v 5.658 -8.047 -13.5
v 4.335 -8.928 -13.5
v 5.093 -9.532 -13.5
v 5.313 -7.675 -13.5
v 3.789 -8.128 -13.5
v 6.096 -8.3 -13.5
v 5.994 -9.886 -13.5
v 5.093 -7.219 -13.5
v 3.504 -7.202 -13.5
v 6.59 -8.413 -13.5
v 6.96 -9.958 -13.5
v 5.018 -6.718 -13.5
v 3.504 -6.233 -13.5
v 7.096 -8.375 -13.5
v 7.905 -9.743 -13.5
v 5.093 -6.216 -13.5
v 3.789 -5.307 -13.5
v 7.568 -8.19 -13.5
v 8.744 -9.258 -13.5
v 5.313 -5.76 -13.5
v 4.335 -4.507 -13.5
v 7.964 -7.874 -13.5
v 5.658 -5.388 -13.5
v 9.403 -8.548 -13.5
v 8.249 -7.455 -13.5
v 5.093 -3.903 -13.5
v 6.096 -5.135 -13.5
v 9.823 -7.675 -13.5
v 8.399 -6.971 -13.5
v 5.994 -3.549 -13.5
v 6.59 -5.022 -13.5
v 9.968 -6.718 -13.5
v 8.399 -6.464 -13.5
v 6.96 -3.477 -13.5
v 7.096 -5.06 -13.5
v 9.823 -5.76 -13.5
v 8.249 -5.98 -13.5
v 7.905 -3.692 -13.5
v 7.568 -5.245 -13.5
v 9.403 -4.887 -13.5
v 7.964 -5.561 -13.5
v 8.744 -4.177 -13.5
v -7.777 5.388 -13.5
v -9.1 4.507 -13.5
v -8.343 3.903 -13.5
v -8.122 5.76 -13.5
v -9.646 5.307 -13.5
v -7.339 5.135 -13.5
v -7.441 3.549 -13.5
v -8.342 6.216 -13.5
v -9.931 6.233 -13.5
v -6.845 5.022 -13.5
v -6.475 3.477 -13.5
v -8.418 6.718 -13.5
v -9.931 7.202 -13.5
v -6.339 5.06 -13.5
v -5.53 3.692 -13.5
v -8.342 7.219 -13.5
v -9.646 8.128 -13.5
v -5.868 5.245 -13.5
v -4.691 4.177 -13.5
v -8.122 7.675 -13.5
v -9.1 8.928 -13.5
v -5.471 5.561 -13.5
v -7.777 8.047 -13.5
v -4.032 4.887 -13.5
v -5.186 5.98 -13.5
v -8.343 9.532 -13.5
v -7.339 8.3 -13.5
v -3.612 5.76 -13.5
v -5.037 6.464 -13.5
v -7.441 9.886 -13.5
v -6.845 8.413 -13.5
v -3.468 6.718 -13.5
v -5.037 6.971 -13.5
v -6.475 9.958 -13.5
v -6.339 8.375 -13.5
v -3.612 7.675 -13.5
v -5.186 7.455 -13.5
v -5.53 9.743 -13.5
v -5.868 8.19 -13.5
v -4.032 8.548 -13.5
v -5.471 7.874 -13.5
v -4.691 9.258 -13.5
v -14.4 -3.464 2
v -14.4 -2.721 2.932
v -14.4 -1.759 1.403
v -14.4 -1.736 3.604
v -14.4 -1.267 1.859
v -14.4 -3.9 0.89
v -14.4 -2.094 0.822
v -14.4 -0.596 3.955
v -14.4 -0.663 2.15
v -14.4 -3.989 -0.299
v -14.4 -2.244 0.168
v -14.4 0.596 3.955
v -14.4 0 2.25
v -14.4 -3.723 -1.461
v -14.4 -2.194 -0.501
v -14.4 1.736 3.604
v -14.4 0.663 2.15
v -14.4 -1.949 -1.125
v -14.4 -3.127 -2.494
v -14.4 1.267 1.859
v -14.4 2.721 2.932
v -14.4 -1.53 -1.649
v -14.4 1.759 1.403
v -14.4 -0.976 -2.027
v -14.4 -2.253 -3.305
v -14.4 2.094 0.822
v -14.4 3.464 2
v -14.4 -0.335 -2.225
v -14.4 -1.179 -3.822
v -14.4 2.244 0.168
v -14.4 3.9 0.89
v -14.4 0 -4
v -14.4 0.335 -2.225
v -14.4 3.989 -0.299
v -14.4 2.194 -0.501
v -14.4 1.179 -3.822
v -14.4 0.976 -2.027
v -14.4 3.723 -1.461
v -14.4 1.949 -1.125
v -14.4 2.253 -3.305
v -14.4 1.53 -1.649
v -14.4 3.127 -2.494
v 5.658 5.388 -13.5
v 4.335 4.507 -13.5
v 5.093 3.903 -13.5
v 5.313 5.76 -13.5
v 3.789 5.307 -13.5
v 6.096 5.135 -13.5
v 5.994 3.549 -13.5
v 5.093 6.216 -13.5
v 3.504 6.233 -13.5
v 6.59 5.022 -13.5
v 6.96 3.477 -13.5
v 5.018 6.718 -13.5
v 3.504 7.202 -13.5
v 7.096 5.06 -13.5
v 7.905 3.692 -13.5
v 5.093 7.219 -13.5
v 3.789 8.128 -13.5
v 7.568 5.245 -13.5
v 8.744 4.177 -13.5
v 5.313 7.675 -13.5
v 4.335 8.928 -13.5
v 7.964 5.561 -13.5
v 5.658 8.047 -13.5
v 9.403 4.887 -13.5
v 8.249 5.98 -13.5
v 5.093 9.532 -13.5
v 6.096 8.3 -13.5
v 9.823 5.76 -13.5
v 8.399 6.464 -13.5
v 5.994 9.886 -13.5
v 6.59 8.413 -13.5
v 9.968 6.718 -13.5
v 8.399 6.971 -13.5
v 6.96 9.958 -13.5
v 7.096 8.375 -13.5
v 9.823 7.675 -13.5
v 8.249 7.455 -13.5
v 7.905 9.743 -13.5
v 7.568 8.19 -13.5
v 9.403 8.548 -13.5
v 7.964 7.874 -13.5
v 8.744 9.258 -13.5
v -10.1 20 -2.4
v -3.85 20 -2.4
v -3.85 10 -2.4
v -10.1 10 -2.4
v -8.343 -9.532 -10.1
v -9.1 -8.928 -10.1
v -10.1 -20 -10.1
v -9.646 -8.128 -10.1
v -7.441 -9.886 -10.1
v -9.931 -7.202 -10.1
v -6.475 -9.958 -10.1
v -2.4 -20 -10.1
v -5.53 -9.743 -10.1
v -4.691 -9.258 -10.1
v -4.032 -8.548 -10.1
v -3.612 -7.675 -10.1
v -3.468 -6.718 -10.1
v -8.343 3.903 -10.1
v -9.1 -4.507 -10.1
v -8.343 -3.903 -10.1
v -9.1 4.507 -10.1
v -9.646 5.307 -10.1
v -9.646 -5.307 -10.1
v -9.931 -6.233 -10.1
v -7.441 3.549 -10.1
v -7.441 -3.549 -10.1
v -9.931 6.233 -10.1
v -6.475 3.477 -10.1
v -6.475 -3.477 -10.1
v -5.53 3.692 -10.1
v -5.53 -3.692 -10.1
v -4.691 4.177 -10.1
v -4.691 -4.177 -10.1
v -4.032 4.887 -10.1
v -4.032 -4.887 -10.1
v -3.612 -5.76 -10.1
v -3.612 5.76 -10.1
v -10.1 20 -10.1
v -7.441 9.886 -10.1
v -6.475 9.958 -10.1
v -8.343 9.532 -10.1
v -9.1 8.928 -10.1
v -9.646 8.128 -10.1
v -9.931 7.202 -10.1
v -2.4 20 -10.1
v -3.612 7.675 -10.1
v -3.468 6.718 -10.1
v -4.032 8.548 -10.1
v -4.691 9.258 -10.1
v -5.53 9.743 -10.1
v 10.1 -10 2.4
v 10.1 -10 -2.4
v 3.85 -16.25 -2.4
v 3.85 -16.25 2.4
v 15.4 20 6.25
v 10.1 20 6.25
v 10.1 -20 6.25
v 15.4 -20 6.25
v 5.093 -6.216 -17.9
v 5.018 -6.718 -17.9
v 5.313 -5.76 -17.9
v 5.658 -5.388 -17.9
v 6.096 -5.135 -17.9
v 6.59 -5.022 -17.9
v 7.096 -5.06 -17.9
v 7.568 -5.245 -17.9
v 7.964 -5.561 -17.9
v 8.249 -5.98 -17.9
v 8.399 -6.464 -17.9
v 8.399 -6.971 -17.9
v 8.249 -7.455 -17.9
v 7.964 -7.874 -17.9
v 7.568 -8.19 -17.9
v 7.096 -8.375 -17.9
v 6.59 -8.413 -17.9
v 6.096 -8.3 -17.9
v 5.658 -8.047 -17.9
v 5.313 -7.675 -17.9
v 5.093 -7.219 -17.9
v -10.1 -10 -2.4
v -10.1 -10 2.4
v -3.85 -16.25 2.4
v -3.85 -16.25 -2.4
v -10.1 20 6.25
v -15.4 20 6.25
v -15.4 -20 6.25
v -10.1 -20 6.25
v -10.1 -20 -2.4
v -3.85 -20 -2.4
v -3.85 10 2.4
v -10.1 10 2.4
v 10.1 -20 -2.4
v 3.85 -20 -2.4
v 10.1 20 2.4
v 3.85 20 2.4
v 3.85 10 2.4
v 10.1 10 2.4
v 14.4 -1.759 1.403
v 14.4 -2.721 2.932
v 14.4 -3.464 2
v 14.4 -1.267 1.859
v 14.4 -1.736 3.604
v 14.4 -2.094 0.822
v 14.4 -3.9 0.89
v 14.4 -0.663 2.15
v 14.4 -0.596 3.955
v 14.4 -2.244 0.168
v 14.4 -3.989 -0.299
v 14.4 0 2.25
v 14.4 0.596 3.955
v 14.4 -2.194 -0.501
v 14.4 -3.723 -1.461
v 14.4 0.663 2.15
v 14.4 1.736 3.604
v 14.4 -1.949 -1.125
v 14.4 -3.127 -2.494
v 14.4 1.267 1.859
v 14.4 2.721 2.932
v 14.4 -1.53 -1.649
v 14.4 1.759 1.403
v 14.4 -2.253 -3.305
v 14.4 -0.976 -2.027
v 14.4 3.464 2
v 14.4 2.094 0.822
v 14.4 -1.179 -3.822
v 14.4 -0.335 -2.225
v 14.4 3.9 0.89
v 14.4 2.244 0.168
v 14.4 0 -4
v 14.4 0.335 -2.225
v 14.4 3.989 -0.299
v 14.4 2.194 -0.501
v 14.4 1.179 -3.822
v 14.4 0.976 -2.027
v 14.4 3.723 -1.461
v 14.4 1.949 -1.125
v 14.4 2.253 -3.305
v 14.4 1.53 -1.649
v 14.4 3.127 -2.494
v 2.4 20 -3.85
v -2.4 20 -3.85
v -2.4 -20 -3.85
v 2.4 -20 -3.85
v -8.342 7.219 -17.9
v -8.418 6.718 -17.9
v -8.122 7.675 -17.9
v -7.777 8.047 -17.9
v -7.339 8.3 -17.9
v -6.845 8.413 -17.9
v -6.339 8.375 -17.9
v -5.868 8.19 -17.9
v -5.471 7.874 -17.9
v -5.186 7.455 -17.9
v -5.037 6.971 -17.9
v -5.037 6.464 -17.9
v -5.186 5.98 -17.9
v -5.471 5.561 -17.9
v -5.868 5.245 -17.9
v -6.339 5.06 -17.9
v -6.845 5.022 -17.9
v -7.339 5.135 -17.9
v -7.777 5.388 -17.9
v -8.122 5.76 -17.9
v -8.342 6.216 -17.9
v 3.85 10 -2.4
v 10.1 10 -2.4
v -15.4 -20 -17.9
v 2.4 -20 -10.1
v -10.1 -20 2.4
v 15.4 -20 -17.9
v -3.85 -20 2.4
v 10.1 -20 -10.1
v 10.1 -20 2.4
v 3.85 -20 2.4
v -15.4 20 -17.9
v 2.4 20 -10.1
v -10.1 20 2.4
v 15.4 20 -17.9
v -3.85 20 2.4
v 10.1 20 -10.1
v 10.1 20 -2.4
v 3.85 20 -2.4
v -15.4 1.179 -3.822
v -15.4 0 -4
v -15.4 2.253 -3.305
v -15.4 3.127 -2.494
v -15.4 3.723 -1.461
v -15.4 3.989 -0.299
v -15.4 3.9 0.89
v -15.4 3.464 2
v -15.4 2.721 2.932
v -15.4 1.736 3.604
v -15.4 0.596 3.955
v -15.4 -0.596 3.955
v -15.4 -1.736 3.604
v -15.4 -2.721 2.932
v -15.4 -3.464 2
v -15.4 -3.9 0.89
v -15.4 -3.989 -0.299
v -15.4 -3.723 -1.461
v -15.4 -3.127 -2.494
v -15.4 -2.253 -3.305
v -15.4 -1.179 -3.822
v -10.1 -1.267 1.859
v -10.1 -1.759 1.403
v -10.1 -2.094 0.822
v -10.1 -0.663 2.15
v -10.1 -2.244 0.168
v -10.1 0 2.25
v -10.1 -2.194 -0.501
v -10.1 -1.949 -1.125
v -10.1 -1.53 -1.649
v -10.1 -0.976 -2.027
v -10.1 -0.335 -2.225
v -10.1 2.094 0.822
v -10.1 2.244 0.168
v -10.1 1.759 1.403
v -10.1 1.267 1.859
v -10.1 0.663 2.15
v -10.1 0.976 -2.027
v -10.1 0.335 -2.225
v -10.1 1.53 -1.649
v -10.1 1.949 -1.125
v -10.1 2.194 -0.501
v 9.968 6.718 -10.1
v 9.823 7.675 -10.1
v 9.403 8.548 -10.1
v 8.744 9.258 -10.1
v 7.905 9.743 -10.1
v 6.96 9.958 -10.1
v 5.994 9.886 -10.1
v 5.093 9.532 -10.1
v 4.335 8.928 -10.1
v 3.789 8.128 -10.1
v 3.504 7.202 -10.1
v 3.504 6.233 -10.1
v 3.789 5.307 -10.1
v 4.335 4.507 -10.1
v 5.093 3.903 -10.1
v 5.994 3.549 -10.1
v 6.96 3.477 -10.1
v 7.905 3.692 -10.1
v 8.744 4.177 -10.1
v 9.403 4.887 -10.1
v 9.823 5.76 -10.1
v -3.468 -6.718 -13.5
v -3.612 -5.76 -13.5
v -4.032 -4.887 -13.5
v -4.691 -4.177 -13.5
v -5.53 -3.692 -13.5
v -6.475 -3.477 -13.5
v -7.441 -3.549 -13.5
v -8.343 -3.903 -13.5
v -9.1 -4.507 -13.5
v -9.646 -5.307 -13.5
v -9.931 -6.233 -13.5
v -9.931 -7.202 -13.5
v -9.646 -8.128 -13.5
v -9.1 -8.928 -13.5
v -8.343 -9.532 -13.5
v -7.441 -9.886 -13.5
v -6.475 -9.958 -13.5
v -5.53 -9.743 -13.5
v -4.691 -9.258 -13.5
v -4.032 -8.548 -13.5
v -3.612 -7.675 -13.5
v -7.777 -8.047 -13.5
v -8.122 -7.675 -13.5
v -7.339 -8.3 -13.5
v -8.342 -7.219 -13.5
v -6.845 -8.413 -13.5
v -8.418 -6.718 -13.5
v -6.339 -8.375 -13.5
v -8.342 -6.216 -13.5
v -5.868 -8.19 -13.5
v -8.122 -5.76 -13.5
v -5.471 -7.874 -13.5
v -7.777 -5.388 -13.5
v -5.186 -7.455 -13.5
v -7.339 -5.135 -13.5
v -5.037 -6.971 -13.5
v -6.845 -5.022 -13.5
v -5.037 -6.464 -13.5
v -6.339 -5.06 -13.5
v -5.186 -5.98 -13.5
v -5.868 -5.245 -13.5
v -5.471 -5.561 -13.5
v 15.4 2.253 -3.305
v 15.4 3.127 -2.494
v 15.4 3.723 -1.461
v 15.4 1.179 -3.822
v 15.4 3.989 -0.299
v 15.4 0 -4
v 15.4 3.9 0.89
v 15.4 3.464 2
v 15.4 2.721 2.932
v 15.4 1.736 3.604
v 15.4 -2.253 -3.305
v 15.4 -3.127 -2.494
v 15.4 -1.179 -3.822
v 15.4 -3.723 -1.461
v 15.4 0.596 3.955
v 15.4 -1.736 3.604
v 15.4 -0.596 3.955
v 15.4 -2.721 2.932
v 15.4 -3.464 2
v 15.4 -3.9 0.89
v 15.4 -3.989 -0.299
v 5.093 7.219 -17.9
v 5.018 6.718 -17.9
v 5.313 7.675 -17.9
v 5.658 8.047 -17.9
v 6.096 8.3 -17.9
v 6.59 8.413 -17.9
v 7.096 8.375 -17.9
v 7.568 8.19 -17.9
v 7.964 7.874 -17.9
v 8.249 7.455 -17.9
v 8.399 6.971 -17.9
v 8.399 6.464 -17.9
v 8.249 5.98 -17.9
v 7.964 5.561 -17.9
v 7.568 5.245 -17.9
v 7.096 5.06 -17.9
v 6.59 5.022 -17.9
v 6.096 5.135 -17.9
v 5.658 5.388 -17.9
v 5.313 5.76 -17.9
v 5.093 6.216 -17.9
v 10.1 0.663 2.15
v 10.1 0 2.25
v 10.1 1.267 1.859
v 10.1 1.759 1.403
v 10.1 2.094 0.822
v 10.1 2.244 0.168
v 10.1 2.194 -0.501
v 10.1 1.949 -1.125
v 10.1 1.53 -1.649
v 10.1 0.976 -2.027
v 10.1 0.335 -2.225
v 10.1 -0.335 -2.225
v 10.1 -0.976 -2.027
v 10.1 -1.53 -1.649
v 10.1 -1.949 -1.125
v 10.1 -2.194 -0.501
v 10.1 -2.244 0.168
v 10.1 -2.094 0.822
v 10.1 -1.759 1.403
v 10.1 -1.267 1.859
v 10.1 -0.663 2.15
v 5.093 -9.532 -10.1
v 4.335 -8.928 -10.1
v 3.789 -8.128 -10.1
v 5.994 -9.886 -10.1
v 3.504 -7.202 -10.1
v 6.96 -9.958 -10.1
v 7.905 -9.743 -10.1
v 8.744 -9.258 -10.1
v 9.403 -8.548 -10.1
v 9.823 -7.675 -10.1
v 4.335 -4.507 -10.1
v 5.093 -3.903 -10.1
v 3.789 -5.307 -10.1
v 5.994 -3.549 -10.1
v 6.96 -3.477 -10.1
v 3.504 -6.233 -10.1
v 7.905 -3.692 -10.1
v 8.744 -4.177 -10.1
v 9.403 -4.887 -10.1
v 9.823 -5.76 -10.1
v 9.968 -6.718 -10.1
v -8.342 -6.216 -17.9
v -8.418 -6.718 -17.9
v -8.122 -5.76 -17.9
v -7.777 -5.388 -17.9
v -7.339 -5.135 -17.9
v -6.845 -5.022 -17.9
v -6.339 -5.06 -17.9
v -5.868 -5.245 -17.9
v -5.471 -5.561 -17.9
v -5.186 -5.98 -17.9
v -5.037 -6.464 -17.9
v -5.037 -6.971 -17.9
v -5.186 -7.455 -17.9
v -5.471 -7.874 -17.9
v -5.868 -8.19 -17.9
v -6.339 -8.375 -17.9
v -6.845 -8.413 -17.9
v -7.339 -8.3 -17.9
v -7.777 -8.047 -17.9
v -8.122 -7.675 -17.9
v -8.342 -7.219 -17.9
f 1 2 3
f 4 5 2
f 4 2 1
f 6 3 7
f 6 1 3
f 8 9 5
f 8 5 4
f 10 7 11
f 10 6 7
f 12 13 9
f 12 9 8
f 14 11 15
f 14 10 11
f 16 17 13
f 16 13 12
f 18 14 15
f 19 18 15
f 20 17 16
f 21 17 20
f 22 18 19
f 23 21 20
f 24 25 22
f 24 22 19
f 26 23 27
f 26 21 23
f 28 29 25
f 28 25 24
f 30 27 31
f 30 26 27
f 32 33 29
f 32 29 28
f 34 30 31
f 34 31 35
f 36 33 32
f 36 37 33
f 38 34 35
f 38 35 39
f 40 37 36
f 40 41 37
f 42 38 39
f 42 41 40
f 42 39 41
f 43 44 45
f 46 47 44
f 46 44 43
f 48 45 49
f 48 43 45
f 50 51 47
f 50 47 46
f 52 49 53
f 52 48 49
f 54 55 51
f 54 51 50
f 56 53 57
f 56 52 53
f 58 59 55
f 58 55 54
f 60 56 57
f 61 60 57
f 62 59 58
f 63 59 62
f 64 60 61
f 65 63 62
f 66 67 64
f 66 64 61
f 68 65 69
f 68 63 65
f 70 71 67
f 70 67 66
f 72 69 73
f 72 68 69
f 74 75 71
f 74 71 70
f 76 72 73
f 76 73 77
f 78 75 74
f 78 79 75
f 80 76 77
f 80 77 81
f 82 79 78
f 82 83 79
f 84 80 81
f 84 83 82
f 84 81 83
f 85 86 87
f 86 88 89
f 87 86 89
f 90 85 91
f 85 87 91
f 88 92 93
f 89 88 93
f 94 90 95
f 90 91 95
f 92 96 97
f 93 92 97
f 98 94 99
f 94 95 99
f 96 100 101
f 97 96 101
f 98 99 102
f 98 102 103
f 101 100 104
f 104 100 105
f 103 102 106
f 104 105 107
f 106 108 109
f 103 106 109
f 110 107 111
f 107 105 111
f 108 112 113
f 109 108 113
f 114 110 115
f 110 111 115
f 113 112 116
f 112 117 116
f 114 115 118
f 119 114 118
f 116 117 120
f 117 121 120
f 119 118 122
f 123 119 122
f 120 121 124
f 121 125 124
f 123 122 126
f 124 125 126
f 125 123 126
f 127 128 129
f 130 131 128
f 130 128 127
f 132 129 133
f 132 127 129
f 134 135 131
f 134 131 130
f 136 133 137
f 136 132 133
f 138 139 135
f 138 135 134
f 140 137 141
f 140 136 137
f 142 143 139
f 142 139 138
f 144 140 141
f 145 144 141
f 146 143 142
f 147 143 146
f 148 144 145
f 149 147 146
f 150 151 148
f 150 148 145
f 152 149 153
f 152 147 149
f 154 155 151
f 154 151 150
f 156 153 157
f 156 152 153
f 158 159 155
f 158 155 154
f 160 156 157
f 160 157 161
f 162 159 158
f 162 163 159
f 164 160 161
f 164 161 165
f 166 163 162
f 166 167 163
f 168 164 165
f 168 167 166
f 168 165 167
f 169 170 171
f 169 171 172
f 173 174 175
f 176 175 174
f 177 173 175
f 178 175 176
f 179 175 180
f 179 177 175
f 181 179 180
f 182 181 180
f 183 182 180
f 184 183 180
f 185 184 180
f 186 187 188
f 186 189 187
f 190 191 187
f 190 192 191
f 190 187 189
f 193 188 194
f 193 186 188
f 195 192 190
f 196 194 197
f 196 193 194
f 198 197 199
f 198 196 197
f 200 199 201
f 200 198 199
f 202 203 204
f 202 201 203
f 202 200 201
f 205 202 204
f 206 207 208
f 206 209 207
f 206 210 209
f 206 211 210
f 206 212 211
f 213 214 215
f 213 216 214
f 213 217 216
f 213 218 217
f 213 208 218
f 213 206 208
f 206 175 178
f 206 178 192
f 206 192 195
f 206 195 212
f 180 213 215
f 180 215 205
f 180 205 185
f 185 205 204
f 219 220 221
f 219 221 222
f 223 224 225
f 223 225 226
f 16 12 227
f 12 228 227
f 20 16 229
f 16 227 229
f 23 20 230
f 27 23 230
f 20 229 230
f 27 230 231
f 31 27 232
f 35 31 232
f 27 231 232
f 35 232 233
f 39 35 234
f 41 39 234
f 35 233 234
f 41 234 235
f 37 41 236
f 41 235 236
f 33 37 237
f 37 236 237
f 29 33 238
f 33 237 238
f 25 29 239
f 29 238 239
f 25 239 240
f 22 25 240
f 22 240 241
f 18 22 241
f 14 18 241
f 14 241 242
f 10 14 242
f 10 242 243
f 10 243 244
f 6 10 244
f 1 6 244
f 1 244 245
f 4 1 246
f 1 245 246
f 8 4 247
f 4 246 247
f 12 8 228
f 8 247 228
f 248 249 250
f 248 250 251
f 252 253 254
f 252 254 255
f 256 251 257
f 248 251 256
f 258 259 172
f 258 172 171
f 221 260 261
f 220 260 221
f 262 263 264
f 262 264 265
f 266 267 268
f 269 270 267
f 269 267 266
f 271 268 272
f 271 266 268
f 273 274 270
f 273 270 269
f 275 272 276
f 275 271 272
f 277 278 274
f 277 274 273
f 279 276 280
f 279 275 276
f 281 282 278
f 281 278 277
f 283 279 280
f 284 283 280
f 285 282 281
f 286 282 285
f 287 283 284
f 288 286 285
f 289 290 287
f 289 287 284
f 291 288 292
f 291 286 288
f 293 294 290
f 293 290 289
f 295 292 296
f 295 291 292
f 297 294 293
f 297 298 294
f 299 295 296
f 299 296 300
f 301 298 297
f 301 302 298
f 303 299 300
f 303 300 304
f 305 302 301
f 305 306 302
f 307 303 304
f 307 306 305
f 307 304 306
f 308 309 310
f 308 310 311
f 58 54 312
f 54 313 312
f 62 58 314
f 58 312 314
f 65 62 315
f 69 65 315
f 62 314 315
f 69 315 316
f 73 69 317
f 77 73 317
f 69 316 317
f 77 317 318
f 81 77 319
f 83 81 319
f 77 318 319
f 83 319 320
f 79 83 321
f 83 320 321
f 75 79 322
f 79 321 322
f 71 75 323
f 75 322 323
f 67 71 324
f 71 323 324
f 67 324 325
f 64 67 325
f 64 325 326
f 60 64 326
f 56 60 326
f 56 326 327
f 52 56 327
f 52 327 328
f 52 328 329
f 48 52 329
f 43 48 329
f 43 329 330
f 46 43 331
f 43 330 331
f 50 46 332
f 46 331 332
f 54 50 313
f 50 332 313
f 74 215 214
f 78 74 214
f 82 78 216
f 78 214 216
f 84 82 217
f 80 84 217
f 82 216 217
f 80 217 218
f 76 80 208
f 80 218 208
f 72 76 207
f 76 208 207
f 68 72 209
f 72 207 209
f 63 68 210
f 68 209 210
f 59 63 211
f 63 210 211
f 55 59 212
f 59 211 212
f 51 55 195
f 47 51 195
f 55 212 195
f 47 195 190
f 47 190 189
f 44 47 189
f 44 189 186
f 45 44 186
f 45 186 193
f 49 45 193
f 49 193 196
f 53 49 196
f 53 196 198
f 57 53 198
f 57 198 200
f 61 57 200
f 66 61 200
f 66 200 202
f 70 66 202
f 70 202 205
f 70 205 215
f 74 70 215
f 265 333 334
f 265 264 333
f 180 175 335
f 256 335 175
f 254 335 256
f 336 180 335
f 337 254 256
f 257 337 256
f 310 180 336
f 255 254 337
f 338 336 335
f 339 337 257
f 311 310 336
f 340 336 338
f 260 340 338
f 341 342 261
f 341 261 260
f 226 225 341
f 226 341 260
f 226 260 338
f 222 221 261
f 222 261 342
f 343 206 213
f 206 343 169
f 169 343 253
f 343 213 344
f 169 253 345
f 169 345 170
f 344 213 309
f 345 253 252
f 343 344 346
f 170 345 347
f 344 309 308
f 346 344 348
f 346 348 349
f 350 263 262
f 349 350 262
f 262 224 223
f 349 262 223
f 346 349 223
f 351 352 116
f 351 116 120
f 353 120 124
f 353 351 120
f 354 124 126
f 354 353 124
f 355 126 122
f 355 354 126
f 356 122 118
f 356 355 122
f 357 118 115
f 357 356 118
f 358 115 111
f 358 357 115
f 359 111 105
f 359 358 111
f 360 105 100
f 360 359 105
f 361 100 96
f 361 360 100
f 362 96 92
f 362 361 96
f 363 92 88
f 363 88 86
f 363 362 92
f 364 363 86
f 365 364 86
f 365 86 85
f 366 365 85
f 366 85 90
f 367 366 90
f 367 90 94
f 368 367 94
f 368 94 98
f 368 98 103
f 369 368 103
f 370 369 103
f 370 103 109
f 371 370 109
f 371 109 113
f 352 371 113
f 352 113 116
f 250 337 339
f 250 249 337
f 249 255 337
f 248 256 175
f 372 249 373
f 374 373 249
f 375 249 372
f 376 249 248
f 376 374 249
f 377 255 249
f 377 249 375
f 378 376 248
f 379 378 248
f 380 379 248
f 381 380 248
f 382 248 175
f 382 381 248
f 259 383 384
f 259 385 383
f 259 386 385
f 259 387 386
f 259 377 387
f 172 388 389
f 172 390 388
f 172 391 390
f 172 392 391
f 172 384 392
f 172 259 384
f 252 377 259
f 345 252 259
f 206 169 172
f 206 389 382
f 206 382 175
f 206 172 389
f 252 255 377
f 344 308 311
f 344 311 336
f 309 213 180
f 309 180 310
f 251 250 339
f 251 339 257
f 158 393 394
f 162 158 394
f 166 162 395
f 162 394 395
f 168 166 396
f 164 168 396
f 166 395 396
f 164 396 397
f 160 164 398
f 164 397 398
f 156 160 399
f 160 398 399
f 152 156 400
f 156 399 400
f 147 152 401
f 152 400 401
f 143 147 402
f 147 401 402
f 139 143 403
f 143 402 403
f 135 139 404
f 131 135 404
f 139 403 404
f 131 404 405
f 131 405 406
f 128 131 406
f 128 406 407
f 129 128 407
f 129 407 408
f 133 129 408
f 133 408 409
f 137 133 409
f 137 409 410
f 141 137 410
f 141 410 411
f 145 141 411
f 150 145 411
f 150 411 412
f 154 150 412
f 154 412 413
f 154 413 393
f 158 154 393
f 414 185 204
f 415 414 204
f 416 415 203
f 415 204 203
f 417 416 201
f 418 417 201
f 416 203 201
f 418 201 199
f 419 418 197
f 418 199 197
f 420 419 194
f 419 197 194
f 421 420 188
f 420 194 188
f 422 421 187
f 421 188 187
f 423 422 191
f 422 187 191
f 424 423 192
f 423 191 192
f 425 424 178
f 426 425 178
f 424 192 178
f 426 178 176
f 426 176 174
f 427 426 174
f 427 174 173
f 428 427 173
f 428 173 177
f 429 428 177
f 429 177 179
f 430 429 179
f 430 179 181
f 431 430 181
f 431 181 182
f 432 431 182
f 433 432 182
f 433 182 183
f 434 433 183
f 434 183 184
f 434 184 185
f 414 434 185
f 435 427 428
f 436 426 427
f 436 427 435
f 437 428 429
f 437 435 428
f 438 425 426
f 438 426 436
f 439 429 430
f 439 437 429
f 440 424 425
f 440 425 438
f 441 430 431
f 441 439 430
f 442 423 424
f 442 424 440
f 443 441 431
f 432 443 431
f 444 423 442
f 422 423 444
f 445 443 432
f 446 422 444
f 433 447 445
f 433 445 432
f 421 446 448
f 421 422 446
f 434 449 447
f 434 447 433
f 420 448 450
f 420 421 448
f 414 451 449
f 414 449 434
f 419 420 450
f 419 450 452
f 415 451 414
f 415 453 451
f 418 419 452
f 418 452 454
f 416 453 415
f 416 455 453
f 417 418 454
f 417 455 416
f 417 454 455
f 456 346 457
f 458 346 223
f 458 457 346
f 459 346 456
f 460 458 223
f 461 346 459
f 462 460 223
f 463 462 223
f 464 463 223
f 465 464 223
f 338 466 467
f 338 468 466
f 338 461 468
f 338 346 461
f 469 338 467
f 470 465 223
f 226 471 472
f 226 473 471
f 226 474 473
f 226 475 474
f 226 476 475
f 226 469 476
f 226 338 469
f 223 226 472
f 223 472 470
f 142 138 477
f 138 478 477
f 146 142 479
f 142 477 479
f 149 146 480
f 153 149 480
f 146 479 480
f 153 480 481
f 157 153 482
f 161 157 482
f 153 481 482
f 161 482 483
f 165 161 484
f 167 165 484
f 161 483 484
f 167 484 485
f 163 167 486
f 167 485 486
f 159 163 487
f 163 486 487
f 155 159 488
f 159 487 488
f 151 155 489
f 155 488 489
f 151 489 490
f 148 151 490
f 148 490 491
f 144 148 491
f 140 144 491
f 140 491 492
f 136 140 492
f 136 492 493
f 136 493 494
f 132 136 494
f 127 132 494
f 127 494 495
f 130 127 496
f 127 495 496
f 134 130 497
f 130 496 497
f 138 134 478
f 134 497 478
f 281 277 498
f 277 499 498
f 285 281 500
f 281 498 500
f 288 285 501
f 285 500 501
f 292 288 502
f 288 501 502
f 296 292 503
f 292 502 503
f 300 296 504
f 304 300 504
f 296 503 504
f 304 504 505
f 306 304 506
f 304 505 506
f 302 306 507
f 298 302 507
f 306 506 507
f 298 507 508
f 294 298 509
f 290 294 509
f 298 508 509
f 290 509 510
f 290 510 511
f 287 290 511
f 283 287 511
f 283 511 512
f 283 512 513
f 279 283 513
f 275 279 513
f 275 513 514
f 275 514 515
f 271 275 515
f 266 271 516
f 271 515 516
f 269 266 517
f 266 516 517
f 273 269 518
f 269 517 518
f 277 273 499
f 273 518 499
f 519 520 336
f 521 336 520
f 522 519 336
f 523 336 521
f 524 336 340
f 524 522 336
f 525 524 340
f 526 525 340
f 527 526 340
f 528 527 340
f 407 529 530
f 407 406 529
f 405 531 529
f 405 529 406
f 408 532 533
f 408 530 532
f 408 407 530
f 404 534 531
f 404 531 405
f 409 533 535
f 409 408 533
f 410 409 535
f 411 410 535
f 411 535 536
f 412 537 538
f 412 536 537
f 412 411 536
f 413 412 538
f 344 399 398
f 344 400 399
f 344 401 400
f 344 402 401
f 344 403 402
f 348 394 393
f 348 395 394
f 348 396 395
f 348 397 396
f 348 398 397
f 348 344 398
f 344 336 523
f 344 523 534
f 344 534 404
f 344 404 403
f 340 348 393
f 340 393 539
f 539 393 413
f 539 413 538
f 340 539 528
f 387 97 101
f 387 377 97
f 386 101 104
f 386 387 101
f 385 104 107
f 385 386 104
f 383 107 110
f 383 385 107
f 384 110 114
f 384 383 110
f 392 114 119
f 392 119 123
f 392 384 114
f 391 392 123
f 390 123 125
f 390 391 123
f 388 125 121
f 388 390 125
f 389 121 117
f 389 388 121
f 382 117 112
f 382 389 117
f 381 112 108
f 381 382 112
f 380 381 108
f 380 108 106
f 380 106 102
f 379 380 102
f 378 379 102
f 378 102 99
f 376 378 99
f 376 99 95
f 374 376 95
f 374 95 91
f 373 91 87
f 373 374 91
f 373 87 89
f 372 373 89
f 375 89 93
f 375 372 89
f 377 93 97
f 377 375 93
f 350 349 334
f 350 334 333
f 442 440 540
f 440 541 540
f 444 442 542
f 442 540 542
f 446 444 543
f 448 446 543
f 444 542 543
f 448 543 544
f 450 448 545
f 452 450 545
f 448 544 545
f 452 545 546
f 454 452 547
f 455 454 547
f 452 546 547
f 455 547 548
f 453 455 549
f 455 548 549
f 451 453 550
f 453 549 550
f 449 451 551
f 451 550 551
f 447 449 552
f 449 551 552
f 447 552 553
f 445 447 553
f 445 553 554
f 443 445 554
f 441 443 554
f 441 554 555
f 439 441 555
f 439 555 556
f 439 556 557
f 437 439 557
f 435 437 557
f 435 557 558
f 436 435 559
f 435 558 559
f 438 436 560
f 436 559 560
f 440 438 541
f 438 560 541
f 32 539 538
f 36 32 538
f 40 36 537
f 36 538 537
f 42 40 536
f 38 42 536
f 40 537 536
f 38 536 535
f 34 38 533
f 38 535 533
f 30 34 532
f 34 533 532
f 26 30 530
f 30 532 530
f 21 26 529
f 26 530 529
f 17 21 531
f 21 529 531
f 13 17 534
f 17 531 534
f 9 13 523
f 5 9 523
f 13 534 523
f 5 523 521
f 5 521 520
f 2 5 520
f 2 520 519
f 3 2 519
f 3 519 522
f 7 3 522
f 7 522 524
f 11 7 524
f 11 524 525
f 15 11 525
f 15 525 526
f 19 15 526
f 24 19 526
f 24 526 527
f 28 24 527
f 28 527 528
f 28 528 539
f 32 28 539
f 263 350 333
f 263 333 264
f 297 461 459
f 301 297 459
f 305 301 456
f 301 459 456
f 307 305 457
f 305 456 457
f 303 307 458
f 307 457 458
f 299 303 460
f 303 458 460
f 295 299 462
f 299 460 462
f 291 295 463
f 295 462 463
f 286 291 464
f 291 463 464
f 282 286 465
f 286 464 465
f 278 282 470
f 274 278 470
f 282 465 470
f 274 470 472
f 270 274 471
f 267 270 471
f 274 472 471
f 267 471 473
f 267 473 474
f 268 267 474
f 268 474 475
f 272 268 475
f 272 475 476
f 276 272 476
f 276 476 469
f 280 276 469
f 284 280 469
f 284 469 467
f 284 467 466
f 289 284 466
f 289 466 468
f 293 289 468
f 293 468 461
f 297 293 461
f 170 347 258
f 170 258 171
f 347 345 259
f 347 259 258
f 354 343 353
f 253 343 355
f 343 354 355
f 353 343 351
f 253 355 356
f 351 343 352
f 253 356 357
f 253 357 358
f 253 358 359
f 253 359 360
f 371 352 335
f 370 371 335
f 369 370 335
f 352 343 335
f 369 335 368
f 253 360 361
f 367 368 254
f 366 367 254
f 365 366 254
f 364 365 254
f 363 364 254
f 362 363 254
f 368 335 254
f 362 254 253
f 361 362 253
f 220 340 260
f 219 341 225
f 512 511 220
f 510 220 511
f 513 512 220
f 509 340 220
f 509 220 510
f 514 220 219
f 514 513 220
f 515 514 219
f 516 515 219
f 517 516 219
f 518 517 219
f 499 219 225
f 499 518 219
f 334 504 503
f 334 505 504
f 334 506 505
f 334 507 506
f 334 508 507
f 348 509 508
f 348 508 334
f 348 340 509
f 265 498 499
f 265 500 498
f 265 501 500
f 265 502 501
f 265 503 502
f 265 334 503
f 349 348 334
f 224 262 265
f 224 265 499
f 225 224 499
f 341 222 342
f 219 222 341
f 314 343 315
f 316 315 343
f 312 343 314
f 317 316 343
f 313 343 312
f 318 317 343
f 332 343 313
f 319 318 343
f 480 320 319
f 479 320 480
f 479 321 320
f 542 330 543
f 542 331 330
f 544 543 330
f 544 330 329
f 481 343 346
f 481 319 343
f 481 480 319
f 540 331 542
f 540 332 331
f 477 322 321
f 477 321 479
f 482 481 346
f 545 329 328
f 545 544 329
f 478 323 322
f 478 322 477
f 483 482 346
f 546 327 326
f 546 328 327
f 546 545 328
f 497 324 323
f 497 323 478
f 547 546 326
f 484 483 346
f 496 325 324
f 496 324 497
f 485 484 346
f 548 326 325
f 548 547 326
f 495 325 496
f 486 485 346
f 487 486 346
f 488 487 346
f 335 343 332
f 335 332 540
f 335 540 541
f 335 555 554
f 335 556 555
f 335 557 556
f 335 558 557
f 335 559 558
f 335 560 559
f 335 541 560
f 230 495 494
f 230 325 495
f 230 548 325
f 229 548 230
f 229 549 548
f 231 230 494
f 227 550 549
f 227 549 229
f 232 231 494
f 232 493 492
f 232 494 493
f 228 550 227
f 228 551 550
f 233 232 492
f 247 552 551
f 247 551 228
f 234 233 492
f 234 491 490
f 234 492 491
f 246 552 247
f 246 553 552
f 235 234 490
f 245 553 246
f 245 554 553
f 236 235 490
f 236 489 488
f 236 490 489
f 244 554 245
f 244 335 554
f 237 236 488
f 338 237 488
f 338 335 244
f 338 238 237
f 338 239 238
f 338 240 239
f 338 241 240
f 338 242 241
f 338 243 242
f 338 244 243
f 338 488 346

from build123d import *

# Parameters (mm, degrees)
BOSS_EXTRU_1_DEPTH                                = 20
CHAMBRAGE_POUR_VIS_SIX_PANS_CREUX_M41_D           = 4.5
CHAMBRAGE_POUR_VIS_SIX_PANS_CREUX_M41_DEPTH       = 11.55
CHAMBRAGE_POUR_VIS_SIX_PANS_CREUX_M41_CBORE_D     = 8
CHAMBRAGE_POUR_VIS_SIX_PANS_CREUX_M41_CBORE_DEPTH = 1
ESQUISSE6_W                                       = 20.2
ESQUISSE6_H                                       = 20
ENL_V_MAT_EXTRU_1_DEPTH                           = 3
ESQUISSE14_W                                      = 30.8
ESQUISSE14_H                                      = 2.5
BOSS_EXTRU_3_DEPTH                                = 40
CHAMBRAGE_POUR_VIS_SIX_PANS_CREUX_M31_D           = 3.4
CHAMBRAGE_POUR_VIS_SIX_PANS_CREUX_M31_CBORE_D     = 6.5
CHAMBRAGE_POUR_VIS_SIX_PANS_CREUX_M31_CBORE_DEPTH = 3.4
CHANFREIN1_SIZE                                   = 6.25


with BuildPart() as part:
    # Base → Boss.-Extru.1 (new, symmetric)
    with BuildSketch(Plane(origin=(0, 0, 0), x_dir=(1, 0, 0), z_dir=(0, 1, 0))):
        Polygon((-3.85, -2.4), (-3.85, 2.4), (-10.1, 2.4), (-10.1, 10.1), (-2.4, 10.1), (-2.4, 3.85), (2.4, 3.85), (2.4, 10.1), (10.1, 10.1), (10.1, 2.4), (3.85, 2.4), (3.85, -2.4), (10.1, -2.4), (10.1, -6.25), (15.4, -6.25), (15.4, 15.4), (-15.4, 15.4), (-15.4, -6.25), (-10.1, -6.25), (-10.1, -2.4), align=None)
    extrude(amount=BOSS_EXTRU_1_DEPTH, both=True)

    # Chambrage pour vis à six pans creux M41
    with Locations(Plane(origin=(15.4, 0, 0), x_dir=(0, 0, -1), z_dir=(1, 0, 0))):
        with Locations((0, 0)):
            chambrage_pour_vis_six_pans_creux_m41 = CounterBoreHole(CHAMBRAGE_POUR_VIS_SIX_PANS_CREUX_M41_D / 2, CHAMBRAGE_POUR_VIS_SIX_PANS_CREUX_M41_CBORE_D / 2, CHAMBRAGE_POUR_VIS_SIX_PANS_CREUX_M41_CBORE_DEPTH, depth=CHAMBRAGE_POUR_VIS_SIX_PANS_CREUX_M41_DEPTH)

    # Symétrie1: Chambrage pour vis à six pans creux M41 across plane
    add(chambrage_pour_vis_six_pans_creux_m41.mirror(Plane(origin=(0, 0, 0), x_dir=(0, 0, 1), z_dir=(1, 0, 0))), mode=Mode.SUBTRACT)

    # Esquisse6 → Enlèv. mat.-Extru.1 (cut, symmetric)
    with BuildSketch(Plane.XY):
        Rectangle(ESQUISSE6_W, ESQUISSE6_H)
    extrude(amount=ENL_V_MAT_EXTRU_1_DEPTH, both=True, mode=Mode.SUBTRACT)

    # Esquisse14 → Boss.-Extru.3 (add)
    with BuildSketch(Plane.XZ.offset(20)):
        with Locations((0, -16.65)):
            Rectangle(ESQUISSE14_W, ESQUISSE14_H)
    extrude(amount=-BOSS_EXTRU_3_DEPTH)

    # Chambrage pour vis à six pans creux M31 (through all)
    with Locations(Plane.XY.offset(-10.1)):
        with Locations((-6.717514421, 6.717514421), (-6.717514421, -6.717514421), (6.717514421, 6.717514421), (6.717514421, -6.717514421)):
            CounterBoreHole(CHAMBRAGE_POUR_VIS_SIX_PANS_CREUX_M31_D / 2, CHAMBRAGE_POUR_VIS_SIX_PANS_CREUX_M31_CBORE_D / 2, CHAMBRAGE_POUR_VIS_SIX_PANS_CREUX_M31_CBORE_DEPTH)

    # Chanfrein1
    chanfrein1_edges = [part.edges().sort_by_distance(p)[0] for p in [
        (3.85, -10, 0),
        (-3.85, -10, 0),
    ]]
    chamfer(chanfrein1_edges, length=CHANFREIN1_SIZE - 0.0001)  # a hair under: the kernel refuses the full size


solid = part.part
